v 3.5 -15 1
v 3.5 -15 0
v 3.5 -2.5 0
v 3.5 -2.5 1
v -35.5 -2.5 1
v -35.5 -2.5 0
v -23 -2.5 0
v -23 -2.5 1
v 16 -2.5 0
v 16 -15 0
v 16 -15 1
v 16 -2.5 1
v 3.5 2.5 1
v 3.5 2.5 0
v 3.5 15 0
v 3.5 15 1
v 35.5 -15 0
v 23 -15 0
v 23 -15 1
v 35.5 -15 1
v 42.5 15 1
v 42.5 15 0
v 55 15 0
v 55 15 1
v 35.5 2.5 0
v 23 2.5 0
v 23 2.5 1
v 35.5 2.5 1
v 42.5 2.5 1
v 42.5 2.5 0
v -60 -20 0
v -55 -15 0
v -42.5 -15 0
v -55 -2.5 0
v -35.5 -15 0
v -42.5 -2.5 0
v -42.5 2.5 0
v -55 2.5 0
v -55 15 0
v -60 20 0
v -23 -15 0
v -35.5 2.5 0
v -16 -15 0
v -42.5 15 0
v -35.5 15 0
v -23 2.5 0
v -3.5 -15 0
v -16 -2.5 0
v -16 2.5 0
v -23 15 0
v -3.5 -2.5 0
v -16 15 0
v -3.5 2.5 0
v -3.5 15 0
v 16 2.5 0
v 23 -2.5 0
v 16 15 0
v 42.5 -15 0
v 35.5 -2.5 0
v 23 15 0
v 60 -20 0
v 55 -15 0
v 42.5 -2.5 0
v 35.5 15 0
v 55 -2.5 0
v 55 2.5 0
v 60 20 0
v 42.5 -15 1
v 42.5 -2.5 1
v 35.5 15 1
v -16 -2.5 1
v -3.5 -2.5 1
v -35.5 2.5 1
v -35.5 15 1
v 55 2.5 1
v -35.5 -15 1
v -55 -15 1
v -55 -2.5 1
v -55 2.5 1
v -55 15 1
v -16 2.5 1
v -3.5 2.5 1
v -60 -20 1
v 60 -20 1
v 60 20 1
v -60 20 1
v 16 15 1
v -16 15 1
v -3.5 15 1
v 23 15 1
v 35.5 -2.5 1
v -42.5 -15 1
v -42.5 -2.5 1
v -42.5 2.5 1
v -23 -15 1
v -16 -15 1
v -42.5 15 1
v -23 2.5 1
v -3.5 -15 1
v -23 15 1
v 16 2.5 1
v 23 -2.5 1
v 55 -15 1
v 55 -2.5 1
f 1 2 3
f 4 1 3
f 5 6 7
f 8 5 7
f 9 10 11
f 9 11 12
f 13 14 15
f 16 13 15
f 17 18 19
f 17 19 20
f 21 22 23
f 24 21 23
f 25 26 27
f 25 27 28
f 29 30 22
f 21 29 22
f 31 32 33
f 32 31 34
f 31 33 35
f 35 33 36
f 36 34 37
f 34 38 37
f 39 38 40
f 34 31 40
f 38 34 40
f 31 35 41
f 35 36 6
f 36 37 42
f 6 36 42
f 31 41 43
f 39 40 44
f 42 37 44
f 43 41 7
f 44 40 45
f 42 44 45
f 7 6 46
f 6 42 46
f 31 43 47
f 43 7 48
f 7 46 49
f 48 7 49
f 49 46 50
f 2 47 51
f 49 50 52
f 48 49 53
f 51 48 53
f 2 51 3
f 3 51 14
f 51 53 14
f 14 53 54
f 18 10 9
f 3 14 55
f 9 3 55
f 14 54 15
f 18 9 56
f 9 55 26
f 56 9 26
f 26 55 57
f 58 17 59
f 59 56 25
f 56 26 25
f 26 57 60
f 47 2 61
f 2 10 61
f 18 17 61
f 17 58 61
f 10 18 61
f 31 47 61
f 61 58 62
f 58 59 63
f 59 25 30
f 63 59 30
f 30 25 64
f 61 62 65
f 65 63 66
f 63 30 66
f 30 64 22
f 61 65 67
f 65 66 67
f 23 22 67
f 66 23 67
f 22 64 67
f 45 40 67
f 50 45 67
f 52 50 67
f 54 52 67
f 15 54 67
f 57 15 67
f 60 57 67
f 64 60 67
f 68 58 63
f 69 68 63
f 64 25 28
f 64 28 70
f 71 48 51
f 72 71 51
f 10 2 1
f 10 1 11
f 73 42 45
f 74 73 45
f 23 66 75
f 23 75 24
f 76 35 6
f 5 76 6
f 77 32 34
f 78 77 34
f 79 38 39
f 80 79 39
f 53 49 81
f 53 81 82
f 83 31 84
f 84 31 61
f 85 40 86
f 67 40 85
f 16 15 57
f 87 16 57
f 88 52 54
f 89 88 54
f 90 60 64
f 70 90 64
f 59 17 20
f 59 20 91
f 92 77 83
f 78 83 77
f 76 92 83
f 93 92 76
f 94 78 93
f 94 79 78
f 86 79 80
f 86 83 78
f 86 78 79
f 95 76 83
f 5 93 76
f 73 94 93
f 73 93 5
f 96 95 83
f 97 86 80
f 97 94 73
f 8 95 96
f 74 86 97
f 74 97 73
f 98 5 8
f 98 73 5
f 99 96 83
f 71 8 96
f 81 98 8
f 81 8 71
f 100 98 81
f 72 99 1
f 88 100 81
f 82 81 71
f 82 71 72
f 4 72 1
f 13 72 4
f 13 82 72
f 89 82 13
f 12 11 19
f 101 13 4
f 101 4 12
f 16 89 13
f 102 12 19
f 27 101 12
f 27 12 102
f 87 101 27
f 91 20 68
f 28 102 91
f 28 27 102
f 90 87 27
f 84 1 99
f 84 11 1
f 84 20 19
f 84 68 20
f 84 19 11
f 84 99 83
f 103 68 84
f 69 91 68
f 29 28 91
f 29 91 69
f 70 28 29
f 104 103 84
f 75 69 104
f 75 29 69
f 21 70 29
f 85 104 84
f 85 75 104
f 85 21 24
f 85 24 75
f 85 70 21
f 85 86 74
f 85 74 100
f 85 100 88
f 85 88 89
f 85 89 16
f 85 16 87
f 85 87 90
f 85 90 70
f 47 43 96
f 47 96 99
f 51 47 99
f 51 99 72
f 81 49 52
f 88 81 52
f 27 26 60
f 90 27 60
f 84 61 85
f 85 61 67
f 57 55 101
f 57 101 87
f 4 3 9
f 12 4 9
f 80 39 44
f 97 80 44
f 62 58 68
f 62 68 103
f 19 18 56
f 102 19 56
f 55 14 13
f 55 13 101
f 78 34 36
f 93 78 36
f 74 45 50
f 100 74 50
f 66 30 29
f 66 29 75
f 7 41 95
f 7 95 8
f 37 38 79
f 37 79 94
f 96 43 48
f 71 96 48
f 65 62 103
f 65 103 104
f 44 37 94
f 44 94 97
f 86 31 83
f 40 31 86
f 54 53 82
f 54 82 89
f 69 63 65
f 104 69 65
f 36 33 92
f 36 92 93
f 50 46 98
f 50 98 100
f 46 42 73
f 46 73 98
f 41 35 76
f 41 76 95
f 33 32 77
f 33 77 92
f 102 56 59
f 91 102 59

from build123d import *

# Parameters (mm, degrees)
F0_W     = 120
F0_H     = 40
F0_W_2   = 12.5
F0_H_2   = 12.5
F1_DEPTH = 1


with BuildPart() as f1:
    # F0 (on Top) → F1 (new body)
    with BuildSketch(Plane.XY):
        Rectangle(F0_W, F0_H)
        with Locations((-48.75, -8.75)):
            Rectangle(F0_W_2, F0_H_2, mode=Mode.SUBTRACT)
        with Locations((-29.25, -8.75)):
            Rectangle(F0_W_2, F0_H_2, mode=Mode.SUBTRACT)
        with Locations((-9.75, -8.75)):
            Rectangle(F0_W_2, F0_H_2, mode=Mode.SUBTRACT)
        with Locations((9.75, -8.75)):
            Rectangle(F0_W_2, F0_H_2, mode=Mode.SUBTRACT)
        with Locations((29.25, -8.75)):
            Rectangle(F0_W_2, F0_H_2, mode=Mode.SUBTRACT)
        with Locations((48.75, -8.75)):
            Rectangle(F0_W_2, F0_H_2, mode=Mode.SUBTRACT)
        with Locations((-48.75, 8.75)):
            Rectangle(F0_W_2, F0_H_2, mode=Mode.SUBTRACT)
        with Locations((-29.25, 8.75)):
            Rectangle(F0_W_2, F0_H_2, mode=Mode.SUBTRACT)
        with Locations((-9.75, 8.75)):
            Rectangle(F0_W_2, F0_H_2, mode=Mode.SUBTRACT)
        with Locations((9.75, 8.75)):
            Rectangle(F0_W_2, F0_H_2, mode=Mode.SUBTRACT)
        with Locations((29.25, 8.75)):
            Rectangle(F0_W_2, F0_H_2, mode=Mode.SUBTRACT)
        with Locations((48.75, 8.75)):
            Rectangle(F0_W_2, F0_H_2, mode=Mode.SUBTRACT)
    extrude(amount=F1_DEPTH)


solid = f1.part
